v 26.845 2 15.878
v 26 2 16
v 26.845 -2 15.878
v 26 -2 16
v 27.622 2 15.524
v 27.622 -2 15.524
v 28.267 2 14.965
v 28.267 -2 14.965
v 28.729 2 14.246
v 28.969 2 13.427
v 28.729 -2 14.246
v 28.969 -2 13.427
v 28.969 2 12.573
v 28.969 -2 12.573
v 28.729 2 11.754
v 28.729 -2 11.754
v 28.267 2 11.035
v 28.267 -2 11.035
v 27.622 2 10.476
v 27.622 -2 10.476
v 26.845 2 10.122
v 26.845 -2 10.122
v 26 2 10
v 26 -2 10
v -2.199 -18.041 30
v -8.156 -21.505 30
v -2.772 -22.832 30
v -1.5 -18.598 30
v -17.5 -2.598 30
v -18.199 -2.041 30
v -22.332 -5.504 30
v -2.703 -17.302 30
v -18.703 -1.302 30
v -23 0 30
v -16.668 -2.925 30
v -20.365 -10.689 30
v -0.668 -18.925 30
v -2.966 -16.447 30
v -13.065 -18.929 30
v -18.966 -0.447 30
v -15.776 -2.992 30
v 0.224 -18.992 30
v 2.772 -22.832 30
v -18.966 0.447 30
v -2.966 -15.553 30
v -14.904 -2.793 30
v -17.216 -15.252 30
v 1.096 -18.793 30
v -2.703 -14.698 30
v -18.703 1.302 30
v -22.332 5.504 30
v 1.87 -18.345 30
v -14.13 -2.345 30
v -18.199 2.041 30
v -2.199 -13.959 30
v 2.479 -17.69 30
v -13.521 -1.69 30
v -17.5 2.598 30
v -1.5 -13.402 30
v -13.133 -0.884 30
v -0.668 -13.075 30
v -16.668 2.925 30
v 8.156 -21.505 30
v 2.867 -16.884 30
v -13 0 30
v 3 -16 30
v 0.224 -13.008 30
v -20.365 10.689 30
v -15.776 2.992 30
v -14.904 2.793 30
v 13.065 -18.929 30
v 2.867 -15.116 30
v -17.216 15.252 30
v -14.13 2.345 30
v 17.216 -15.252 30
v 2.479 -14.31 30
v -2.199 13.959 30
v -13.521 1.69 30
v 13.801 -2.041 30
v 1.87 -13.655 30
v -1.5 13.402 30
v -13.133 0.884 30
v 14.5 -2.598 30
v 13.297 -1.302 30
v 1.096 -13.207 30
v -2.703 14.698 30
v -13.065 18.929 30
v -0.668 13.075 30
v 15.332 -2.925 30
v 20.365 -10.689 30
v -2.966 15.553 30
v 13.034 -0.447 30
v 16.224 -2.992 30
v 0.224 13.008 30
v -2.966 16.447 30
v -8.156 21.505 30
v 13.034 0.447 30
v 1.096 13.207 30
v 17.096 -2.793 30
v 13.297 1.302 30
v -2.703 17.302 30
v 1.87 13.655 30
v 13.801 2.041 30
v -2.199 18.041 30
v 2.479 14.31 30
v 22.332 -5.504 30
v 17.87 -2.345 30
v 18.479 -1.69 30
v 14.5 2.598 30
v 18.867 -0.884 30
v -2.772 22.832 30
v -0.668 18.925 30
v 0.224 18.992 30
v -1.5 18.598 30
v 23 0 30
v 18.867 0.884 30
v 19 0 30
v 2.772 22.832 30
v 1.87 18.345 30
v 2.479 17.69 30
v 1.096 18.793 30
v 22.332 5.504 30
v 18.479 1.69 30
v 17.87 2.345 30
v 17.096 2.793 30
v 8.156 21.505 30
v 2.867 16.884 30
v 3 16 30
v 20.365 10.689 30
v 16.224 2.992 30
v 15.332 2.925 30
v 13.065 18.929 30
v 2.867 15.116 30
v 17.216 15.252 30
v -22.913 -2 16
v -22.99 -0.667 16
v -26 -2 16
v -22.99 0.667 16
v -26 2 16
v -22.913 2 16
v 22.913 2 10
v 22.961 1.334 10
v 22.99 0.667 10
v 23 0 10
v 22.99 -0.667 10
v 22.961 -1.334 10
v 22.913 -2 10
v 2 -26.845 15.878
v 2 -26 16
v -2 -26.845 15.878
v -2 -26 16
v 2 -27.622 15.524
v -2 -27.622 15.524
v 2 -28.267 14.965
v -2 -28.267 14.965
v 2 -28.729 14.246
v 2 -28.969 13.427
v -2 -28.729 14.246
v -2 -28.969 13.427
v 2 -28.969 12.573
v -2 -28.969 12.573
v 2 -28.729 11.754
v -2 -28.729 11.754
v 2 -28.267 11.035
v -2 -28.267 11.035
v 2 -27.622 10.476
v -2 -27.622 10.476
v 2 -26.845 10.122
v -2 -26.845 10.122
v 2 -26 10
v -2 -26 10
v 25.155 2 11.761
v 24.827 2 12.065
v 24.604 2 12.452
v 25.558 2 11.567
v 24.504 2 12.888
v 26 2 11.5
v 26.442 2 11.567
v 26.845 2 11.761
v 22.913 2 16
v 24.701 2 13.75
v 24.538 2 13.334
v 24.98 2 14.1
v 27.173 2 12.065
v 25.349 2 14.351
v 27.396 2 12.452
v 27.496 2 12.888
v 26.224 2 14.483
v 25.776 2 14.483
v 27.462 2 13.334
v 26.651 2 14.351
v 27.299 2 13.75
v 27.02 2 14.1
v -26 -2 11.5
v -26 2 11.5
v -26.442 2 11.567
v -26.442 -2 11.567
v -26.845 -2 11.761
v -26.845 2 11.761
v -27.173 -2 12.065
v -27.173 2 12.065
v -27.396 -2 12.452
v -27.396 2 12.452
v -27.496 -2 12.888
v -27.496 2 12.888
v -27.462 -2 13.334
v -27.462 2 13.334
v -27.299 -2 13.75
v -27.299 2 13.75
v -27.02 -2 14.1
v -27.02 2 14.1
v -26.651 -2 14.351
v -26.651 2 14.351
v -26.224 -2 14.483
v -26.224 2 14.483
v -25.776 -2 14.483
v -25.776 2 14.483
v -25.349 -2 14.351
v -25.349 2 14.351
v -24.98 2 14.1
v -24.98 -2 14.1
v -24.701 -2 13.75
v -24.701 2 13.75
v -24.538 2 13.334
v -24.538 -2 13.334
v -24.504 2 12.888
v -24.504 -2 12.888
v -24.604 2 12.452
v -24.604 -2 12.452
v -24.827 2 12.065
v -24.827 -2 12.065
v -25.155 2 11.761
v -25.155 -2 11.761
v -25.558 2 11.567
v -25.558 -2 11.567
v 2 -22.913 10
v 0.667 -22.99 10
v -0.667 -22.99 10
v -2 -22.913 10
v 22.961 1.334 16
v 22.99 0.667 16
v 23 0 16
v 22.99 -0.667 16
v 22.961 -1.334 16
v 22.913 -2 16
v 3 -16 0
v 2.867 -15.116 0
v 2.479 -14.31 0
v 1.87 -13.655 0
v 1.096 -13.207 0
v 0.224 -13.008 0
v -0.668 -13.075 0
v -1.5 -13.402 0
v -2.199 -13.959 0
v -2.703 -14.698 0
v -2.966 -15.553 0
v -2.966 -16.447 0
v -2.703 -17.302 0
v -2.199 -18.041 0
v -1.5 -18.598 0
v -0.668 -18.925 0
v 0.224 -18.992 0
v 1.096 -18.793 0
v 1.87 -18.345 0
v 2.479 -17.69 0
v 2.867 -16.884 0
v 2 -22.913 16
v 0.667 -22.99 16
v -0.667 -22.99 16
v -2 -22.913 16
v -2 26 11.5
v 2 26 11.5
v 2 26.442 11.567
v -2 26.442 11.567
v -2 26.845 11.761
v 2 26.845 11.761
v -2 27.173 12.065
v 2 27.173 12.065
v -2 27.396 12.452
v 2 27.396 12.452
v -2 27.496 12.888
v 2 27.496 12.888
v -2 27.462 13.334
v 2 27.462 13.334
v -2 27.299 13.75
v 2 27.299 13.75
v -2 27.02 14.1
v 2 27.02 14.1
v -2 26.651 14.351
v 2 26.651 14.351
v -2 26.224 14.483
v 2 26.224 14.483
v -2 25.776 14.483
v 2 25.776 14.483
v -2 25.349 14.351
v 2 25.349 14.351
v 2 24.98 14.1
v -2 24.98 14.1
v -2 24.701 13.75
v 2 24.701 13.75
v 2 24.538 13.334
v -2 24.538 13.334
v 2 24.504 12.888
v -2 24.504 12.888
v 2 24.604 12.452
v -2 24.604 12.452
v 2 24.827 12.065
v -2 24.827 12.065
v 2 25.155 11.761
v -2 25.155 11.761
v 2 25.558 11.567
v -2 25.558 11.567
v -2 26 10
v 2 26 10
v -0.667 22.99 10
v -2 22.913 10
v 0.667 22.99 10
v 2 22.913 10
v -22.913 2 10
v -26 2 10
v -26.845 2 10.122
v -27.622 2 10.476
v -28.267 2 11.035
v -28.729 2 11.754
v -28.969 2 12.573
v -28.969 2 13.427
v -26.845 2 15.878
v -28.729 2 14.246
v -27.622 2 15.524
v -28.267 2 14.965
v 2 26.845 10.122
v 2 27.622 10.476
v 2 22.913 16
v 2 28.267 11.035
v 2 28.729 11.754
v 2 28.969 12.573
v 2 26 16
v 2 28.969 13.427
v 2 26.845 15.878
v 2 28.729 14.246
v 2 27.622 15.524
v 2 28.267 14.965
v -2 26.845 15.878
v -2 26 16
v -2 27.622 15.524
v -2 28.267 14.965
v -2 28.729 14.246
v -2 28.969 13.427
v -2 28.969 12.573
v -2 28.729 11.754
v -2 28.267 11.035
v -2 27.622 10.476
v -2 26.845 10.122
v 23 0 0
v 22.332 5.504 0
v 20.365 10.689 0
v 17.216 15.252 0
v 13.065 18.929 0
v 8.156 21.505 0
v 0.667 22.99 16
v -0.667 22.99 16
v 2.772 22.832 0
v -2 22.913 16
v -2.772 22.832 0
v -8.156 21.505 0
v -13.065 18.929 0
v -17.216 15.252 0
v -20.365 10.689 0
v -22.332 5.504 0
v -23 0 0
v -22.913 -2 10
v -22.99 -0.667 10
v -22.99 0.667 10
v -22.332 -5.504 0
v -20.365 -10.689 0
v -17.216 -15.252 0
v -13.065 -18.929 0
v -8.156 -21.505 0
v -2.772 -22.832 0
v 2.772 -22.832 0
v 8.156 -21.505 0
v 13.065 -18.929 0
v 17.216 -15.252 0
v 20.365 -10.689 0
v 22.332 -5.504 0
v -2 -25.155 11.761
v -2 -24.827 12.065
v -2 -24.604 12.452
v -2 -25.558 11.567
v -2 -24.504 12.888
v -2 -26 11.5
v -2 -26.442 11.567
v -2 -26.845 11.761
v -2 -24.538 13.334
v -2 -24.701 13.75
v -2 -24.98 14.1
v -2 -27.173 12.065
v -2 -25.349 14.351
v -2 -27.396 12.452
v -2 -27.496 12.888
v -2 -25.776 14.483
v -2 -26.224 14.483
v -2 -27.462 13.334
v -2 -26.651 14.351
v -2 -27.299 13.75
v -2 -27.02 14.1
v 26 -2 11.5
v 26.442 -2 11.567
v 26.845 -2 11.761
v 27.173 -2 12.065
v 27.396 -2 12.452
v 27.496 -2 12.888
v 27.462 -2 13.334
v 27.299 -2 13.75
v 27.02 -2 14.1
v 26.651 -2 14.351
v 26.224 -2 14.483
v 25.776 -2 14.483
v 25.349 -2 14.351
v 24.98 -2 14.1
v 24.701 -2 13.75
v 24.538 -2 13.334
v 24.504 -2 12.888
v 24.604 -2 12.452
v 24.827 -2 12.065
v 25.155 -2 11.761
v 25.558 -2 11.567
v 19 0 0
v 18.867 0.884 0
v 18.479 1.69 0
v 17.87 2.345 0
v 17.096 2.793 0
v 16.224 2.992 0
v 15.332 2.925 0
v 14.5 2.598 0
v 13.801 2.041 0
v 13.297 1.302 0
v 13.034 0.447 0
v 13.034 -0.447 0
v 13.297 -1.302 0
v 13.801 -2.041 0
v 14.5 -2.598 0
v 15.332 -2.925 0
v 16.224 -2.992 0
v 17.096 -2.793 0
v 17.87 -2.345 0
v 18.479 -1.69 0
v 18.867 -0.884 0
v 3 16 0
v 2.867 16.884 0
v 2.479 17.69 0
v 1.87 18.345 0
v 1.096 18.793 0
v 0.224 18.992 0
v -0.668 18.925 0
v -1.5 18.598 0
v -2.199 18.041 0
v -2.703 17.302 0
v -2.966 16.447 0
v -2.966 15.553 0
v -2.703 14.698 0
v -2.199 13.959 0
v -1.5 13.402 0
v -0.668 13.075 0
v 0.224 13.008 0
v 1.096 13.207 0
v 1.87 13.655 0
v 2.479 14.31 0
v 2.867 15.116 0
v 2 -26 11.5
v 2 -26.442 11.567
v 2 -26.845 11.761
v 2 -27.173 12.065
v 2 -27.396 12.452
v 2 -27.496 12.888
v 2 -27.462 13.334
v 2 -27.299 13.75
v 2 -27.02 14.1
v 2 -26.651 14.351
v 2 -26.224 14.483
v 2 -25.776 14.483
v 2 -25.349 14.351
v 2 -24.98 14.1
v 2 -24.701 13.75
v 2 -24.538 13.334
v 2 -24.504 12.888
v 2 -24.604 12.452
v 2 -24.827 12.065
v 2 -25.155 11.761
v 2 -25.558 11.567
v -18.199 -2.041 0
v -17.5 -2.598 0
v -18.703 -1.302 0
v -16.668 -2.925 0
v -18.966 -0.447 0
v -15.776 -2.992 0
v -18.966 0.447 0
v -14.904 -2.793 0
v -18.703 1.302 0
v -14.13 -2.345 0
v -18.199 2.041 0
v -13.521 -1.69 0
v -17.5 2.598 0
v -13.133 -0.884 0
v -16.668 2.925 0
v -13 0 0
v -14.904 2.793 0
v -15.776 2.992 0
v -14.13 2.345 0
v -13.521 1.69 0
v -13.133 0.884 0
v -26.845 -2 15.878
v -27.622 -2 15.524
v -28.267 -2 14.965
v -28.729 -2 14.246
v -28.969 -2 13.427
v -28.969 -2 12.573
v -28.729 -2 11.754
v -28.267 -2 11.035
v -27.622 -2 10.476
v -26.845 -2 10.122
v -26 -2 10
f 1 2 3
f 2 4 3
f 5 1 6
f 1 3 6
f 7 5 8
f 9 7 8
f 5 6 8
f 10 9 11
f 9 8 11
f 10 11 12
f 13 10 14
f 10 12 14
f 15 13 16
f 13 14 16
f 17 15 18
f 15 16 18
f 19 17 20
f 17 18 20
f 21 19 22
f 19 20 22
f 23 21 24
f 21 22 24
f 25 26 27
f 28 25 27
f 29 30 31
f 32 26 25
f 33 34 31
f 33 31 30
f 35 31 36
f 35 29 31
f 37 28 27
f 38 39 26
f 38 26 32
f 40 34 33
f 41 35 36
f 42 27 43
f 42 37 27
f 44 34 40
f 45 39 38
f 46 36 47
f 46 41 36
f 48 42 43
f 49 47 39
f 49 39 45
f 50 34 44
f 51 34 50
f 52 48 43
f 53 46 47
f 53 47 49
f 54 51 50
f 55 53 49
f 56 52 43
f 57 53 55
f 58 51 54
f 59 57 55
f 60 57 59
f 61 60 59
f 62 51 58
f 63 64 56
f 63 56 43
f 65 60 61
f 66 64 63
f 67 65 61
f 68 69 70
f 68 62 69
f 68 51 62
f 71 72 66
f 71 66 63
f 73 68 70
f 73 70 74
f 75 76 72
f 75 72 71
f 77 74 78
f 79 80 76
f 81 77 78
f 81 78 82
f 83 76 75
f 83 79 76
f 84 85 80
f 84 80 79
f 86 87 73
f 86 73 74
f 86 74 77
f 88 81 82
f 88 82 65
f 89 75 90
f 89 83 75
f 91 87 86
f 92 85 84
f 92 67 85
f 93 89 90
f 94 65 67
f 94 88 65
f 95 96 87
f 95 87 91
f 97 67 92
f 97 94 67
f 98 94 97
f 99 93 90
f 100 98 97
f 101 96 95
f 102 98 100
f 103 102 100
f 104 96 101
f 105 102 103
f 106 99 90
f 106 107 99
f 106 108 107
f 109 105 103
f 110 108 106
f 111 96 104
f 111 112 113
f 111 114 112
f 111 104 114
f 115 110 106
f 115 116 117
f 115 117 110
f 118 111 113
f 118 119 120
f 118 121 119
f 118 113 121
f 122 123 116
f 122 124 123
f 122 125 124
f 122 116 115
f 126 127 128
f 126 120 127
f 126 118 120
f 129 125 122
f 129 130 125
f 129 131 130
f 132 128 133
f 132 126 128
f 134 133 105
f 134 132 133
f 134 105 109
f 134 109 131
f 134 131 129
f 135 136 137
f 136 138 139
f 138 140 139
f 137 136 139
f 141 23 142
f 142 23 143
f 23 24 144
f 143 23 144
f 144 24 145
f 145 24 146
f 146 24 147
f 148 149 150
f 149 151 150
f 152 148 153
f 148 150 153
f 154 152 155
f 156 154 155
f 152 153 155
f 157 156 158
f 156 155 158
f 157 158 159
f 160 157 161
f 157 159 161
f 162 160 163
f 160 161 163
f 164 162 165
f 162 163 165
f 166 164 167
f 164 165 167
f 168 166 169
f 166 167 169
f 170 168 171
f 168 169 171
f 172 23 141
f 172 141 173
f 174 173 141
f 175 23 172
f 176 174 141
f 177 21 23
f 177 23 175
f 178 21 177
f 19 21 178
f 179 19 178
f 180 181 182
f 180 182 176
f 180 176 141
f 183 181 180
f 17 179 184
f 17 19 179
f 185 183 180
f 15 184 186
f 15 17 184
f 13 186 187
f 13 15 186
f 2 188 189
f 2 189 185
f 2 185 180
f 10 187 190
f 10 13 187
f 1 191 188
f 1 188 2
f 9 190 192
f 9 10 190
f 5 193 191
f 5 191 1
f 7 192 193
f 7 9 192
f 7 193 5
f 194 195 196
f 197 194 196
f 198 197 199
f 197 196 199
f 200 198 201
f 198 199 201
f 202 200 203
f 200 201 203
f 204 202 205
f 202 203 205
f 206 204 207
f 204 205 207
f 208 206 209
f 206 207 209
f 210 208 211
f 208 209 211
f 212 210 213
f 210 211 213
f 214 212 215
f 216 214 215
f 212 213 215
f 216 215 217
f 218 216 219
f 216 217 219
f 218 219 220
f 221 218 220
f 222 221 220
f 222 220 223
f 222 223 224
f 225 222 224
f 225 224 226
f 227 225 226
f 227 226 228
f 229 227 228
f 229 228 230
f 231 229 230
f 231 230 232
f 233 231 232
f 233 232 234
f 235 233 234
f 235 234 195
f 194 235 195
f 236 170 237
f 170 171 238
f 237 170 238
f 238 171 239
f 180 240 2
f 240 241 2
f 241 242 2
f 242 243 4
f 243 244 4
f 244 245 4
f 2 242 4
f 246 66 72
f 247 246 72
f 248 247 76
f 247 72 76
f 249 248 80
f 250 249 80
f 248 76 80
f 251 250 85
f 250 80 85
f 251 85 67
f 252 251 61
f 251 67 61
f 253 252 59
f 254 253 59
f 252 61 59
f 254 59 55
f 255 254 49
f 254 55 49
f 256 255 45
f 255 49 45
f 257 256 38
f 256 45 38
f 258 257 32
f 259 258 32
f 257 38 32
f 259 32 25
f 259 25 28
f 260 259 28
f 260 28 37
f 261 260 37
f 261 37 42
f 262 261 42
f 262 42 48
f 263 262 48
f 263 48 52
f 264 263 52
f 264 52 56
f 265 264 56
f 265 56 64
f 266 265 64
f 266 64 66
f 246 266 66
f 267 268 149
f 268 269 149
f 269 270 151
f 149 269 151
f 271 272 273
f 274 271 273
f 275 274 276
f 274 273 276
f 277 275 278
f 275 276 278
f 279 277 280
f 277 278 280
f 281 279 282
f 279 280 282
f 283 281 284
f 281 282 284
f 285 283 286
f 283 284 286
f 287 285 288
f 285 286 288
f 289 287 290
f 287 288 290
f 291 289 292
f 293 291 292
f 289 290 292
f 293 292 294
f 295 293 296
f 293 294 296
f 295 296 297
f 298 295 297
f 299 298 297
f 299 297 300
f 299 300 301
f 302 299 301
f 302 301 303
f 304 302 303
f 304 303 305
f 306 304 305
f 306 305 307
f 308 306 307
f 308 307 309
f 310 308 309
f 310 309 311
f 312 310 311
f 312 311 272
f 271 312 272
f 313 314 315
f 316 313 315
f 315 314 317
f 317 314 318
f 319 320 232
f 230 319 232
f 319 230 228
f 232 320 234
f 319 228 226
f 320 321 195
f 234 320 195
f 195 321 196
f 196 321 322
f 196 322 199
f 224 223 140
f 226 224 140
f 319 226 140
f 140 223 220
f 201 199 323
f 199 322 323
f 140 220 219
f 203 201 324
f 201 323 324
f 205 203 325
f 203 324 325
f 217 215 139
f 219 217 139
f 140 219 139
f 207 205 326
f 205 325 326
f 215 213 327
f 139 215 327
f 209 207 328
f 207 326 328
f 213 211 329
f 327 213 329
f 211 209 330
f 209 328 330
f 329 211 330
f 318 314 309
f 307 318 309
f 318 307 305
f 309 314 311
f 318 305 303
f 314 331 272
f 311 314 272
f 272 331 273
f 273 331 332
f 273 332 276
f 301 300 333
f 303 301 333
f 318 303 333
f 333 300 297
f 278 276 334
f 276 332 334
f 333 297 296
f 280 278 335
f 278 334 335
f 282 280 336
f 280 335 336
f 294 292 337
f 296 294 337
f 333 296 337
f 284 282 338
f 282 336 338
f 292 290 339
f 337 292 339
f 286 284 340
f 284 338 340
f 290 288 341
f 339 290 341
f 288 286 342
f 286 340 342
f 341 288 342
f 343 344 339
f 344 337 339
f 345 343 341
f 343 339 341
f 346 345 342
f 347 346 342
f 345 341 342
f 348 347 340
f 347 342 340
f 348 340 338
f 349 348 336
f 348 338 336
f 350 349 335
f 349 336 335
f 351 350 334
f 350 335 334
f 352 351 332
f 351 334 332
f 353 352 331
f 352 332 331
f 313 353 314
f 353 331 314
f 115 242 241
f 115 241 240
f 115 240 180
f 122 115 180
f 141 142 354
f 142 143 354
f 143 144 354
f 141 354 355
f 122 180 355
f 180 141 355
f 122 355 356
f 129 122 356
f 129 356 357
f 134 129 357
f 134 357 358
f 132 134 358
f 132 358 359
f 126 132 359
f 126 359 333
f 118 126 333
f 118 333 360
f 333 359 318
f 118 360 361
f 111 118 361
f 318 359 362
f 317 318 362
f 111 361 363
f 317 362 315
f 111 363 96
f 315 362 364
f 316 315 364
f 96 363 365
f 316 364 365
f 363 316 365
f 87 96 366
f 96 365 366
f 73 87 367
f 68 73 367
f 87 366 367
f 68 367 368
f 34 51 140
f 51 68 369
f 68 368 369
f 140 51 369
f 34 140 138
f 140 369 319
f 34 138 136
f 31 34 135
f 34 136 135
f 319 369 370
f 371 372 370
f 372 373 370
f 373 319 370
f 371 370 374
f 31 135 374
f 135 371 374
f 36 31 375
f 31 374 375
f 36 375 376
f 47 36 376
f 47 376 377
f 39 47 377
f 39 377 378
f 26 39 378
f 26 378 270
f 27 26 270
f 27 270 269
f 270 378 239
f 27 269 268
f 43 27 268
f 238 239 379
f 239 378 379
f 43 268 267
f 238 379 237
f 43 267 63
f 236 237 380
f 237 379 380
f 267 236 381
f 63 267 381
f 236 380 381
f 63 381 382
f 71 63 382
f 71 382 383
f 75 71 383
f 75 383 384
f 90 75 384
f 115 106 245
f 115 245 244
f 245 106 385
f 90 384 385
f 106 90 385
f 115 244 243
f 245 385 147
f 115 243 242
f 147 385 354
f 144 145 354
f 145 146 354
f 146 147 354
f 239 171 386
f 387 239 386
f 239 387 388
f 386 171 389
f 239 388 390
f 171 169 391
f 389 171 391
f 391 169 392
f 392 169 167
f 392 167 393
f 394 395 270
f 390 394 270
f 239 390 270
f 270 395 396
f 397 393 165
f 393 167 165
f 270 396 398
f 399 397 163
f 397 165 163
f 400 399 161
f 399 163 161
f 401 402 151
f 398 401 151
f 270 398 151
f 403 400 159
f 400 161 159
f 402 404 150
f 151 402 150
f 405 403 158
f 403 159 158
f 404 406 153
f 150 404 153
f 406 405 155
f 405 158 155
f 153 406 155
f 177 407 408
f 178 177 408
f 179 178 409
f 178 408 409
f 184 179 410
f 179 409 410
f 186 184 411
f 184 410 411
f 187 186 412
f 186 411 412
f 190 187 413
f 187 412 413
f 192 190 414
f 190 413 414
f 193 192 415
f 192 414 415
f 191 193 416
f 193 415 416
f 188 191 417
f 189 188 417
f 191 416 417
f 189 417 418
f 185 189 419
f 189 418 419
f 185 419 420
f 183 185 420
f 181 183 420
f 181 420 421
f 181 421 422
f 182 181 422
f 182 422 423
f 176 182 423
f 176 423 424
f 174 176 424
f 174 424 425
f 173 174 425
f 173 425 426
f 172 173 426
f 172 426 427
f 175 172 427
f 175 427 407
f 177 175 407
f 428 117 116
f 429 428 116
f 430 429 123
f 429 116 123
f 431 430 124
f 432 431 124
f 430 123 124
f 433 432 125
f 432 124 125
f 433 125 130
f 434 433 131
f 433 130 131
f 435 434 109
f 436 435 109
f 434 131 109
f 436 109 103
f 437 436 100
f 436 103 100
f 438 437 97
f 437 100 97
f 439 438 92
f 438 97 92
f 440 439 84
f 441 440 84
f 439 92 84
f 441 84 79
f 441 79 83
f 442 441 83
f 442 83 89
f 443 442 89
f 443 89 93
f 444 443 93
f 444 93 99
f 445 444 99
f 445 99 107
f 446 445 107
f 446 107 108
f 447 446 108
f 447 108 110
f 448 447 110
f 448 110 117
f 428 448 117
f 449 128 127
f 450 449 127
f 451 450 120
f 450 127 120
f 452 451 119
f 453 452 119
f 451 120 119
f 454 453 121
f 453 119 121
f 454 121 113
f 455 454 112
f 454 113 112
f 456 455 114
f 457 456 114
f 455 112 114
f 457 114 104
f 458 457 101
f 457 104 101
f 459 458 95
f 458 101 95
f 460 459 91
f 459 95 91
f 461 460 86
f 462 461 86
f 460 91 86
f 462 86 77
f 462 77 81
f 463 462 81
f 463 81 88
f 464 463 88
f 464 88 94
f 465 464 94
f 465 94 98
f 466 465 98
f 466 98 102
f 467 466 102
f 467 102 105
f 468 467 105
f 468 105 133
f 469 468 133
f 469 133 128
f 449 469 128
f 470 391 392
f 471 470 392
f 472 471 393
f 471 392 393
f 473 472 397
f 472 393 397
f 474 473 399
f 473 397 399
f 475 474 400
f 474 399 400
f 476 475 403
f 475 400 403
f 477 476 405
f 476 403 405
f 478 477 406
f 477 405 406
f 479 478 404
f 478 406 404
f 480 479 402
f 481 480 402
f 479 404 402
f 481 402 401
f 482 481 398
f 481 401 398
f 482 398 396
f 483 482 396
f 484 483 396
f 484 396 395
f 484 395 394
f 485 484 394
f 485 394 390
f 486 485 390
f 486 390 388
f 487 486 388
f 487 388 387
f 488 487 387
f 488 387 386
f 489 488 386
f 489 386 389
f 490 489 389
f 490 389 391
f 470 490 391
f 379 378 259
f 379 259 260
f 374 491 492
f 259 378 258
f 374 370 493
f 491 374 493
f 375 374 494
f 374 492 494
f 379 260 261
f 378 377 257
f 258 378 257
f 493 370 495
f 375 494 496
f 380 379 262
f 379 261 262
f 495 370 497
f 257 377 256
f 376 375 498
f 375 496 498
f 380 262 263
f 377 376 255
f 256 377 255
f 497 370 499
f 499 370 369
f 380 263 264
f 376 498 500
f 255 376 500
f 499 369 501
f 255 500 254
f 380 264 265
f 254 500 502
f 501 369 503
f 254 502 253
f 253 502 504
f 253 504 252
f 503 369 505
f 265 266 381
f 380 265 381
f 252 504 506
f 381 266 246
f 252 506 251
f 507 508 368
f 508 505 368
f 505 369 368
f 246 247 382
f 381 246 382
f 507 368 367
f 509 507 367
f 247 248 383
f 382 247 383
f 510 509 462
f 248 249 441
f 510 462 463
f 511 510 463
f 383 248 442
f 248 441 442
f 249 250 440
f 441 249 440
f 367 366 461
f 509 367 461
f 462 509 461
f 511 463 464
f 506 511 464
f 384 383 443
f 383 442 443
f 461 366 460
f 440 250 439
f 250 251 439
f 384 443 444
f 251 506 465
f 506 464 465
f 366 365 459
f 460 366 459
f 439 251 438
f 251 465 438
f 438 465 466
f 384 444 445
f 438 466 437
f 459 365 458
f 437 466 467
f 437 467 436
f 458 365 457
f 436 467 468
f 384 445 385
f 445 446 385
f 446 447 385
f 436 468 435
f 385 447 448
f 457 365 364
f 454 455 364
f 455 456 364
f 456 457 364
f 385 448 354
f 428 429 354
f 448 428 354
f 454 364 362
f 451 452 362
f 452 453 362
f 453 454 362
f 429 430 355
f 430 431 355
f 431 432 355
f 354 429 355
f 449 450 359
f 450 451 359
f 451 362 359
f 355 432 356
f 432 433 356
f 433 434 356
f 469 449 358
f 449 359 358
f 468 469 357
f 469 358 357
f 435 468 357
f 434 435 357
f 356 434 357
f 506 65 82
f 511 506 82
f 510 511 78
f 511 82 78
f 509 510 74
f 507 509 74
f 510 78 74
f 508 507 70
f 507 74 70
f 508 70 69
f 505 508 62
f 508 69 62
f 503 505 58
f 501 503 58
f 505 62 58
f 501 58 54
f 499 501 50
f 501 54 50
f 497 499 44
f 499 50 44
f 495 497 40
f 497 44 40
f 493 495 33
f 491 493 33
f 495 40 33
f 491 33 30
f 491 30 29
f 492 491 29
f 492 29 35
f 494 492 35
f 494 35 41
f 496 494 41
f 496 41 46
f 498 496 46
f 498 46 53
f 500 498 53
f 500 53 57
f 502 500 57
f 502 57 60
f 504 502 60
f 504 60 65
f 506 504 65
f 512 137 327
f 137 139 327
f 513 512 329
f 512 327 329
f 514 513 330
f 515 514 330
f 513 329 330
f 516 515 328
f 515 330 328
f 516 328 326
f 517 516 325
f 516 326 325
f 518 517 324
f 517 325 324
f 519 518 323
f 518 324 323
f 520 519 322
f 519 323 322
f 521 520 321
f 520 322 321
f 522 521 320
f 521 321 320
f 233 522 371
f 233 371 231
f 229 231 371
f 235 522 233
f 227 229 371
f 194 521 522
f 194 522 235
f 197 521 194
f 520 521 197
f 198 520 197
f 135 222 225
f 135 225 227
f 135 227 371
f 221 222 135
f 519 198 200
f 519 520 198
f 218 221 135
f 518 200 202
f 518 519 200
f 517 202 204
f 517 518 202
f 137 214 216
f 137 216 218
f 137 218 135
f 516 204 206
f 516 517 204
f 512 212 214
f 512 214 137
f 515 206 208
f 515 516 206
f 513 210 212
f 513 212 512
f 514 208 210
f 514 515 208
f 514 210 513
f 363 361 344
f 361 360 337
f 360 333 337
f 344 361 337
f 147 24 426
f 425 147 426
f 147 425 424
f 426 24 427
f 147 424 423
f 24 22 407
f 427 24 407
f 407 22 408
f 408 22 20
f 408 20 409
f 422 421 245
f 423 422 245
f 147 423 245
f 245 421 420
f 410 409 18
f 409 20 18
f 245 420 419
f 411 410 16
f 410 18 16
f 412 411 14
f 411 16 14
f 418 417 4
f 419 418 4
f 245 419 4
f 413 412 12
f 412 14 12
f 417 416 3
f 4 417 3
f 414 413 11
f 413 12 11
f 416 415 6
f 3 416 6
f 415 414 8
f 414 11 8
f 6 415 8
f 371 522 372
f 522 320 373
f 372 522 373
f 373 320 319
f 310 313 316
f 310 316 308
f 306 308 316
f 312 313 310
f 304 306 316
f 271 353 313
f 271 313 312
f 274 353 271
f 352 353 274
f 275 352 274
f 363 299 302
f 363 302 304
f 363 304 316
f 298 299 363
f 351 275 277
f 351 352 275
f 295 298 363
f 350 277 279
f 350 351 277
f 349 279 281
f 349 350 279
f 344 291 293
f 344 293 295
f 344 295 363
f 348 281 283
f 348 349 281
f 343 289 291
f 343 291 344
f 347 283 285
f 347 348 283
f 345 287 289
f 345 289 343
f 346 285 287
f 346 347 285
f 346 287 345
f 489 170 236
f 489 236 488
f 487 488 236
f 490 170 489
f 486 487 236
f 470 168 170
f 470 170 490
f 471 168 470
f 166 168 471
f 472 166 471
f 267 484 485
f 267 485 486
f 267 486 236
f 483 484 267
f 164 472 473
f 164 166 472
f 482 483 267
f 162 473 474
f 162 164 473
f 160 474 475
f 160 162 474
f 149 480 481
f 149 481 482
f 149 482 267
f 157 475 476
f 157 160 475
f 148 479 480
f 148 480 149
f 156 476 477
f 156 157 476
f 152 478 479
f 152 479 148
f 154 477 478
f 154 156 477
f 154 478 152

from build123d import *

# Parameters (mm, degrees)
SKETCH_1_R               = 23
EXTRUDE_1_DEPTH          = 30
SKETCH_2_R               = 3
CUT_EXTRUDE_1_DEPTH      = 45.24929378
EXTRUDE_2_DEPTH          = 2
SKETCH_4_R               = 1.5
CUT_EXTRUDE_2_DEPTH      = 49.641546028
PATTERN_CIRCULAR_2_COUNT = 4


with BuildPart() as part:
    # 草图1 → 凸台-拉伸1 (new body)
    with BuildSketch(Plane.XY):
        Circle(SKETCH_1_R)
    extrude(amount=EXTRUDE_1_DEPTH)

    # 草图2 → 切除-拉伸1 (cut, through all)
    with BuildSketch(Plane.XY.offset(30)):
        with Locations((16, 0)):
            Circle(SKETCH_2_R)
        with Locations((0, 16)):
            Circle(SKETCH_2_R)
        with Locations((-16, 0)):
            Circle(SKETCH_2_R)
        with Locations((0, -16)):
            Circle(SKETCH_2_R)
    extrude(amount=-CUT_EXTRUDE_1_DEPTH, mode=Mode.SUBTRACT)

    # 草图3 → 凸台-拉伸2 (add, symmetric)
    with BuildSketch(Plane(origin=(0, 0, 0), x_dir=(0, 0, -1), z_dir=(1, 0, 0))):
        with BuildLine():
            Line((-10, 22), (-16, 22))
            Line((-16, 22), (-16, 26))
            ThreePointArc((-16, 26), (-13, 29), (-10, 26))
            Line((-10, 26), (-10, 22))
        make_face()
    extrude_2 = extrude(amount=EXTRUDE_2_DEPTH, both=True)

    # 草图4 → 切除-拉伸2 (cut, through all)
    with BuildSketch(Plane(origin=(2, 0, 0), x_dir=(0, 0, -1), z_dir=(1, 0, 0))):
        with Locations((-13, 26)):
            Circle(SKETCH_4_R)
    cut_extrude_2 = extrude(amount=-CUT_EXTRUDE_2_DEPTH, mode=Mode.SUBTRACT)

    # 阵列(圆周)2: 凸台-拉伸2, 切除-拉伸2 ×4 about axis
    pattern_circular_2_axis = Axis((0, 0, 30), (0, 0, -1))
    add([extrude_2.rotate(pattern_circular_2_axis, i * 360 / PATTERN_CIRCULAR_2_COUNT) for i in range(1, PATTERN_CIRCULAR_2_COUNT)])
    add([cut_extrude_2.rotate(pattern_circular_2_axis, i * 360 / PATTERN_CIRCULAR_2_COUNT) for i in range(1, PATTERN_CIRCULAR_2_COUNT)], mode=Mode.SUBTRACT)


solid = part.part
